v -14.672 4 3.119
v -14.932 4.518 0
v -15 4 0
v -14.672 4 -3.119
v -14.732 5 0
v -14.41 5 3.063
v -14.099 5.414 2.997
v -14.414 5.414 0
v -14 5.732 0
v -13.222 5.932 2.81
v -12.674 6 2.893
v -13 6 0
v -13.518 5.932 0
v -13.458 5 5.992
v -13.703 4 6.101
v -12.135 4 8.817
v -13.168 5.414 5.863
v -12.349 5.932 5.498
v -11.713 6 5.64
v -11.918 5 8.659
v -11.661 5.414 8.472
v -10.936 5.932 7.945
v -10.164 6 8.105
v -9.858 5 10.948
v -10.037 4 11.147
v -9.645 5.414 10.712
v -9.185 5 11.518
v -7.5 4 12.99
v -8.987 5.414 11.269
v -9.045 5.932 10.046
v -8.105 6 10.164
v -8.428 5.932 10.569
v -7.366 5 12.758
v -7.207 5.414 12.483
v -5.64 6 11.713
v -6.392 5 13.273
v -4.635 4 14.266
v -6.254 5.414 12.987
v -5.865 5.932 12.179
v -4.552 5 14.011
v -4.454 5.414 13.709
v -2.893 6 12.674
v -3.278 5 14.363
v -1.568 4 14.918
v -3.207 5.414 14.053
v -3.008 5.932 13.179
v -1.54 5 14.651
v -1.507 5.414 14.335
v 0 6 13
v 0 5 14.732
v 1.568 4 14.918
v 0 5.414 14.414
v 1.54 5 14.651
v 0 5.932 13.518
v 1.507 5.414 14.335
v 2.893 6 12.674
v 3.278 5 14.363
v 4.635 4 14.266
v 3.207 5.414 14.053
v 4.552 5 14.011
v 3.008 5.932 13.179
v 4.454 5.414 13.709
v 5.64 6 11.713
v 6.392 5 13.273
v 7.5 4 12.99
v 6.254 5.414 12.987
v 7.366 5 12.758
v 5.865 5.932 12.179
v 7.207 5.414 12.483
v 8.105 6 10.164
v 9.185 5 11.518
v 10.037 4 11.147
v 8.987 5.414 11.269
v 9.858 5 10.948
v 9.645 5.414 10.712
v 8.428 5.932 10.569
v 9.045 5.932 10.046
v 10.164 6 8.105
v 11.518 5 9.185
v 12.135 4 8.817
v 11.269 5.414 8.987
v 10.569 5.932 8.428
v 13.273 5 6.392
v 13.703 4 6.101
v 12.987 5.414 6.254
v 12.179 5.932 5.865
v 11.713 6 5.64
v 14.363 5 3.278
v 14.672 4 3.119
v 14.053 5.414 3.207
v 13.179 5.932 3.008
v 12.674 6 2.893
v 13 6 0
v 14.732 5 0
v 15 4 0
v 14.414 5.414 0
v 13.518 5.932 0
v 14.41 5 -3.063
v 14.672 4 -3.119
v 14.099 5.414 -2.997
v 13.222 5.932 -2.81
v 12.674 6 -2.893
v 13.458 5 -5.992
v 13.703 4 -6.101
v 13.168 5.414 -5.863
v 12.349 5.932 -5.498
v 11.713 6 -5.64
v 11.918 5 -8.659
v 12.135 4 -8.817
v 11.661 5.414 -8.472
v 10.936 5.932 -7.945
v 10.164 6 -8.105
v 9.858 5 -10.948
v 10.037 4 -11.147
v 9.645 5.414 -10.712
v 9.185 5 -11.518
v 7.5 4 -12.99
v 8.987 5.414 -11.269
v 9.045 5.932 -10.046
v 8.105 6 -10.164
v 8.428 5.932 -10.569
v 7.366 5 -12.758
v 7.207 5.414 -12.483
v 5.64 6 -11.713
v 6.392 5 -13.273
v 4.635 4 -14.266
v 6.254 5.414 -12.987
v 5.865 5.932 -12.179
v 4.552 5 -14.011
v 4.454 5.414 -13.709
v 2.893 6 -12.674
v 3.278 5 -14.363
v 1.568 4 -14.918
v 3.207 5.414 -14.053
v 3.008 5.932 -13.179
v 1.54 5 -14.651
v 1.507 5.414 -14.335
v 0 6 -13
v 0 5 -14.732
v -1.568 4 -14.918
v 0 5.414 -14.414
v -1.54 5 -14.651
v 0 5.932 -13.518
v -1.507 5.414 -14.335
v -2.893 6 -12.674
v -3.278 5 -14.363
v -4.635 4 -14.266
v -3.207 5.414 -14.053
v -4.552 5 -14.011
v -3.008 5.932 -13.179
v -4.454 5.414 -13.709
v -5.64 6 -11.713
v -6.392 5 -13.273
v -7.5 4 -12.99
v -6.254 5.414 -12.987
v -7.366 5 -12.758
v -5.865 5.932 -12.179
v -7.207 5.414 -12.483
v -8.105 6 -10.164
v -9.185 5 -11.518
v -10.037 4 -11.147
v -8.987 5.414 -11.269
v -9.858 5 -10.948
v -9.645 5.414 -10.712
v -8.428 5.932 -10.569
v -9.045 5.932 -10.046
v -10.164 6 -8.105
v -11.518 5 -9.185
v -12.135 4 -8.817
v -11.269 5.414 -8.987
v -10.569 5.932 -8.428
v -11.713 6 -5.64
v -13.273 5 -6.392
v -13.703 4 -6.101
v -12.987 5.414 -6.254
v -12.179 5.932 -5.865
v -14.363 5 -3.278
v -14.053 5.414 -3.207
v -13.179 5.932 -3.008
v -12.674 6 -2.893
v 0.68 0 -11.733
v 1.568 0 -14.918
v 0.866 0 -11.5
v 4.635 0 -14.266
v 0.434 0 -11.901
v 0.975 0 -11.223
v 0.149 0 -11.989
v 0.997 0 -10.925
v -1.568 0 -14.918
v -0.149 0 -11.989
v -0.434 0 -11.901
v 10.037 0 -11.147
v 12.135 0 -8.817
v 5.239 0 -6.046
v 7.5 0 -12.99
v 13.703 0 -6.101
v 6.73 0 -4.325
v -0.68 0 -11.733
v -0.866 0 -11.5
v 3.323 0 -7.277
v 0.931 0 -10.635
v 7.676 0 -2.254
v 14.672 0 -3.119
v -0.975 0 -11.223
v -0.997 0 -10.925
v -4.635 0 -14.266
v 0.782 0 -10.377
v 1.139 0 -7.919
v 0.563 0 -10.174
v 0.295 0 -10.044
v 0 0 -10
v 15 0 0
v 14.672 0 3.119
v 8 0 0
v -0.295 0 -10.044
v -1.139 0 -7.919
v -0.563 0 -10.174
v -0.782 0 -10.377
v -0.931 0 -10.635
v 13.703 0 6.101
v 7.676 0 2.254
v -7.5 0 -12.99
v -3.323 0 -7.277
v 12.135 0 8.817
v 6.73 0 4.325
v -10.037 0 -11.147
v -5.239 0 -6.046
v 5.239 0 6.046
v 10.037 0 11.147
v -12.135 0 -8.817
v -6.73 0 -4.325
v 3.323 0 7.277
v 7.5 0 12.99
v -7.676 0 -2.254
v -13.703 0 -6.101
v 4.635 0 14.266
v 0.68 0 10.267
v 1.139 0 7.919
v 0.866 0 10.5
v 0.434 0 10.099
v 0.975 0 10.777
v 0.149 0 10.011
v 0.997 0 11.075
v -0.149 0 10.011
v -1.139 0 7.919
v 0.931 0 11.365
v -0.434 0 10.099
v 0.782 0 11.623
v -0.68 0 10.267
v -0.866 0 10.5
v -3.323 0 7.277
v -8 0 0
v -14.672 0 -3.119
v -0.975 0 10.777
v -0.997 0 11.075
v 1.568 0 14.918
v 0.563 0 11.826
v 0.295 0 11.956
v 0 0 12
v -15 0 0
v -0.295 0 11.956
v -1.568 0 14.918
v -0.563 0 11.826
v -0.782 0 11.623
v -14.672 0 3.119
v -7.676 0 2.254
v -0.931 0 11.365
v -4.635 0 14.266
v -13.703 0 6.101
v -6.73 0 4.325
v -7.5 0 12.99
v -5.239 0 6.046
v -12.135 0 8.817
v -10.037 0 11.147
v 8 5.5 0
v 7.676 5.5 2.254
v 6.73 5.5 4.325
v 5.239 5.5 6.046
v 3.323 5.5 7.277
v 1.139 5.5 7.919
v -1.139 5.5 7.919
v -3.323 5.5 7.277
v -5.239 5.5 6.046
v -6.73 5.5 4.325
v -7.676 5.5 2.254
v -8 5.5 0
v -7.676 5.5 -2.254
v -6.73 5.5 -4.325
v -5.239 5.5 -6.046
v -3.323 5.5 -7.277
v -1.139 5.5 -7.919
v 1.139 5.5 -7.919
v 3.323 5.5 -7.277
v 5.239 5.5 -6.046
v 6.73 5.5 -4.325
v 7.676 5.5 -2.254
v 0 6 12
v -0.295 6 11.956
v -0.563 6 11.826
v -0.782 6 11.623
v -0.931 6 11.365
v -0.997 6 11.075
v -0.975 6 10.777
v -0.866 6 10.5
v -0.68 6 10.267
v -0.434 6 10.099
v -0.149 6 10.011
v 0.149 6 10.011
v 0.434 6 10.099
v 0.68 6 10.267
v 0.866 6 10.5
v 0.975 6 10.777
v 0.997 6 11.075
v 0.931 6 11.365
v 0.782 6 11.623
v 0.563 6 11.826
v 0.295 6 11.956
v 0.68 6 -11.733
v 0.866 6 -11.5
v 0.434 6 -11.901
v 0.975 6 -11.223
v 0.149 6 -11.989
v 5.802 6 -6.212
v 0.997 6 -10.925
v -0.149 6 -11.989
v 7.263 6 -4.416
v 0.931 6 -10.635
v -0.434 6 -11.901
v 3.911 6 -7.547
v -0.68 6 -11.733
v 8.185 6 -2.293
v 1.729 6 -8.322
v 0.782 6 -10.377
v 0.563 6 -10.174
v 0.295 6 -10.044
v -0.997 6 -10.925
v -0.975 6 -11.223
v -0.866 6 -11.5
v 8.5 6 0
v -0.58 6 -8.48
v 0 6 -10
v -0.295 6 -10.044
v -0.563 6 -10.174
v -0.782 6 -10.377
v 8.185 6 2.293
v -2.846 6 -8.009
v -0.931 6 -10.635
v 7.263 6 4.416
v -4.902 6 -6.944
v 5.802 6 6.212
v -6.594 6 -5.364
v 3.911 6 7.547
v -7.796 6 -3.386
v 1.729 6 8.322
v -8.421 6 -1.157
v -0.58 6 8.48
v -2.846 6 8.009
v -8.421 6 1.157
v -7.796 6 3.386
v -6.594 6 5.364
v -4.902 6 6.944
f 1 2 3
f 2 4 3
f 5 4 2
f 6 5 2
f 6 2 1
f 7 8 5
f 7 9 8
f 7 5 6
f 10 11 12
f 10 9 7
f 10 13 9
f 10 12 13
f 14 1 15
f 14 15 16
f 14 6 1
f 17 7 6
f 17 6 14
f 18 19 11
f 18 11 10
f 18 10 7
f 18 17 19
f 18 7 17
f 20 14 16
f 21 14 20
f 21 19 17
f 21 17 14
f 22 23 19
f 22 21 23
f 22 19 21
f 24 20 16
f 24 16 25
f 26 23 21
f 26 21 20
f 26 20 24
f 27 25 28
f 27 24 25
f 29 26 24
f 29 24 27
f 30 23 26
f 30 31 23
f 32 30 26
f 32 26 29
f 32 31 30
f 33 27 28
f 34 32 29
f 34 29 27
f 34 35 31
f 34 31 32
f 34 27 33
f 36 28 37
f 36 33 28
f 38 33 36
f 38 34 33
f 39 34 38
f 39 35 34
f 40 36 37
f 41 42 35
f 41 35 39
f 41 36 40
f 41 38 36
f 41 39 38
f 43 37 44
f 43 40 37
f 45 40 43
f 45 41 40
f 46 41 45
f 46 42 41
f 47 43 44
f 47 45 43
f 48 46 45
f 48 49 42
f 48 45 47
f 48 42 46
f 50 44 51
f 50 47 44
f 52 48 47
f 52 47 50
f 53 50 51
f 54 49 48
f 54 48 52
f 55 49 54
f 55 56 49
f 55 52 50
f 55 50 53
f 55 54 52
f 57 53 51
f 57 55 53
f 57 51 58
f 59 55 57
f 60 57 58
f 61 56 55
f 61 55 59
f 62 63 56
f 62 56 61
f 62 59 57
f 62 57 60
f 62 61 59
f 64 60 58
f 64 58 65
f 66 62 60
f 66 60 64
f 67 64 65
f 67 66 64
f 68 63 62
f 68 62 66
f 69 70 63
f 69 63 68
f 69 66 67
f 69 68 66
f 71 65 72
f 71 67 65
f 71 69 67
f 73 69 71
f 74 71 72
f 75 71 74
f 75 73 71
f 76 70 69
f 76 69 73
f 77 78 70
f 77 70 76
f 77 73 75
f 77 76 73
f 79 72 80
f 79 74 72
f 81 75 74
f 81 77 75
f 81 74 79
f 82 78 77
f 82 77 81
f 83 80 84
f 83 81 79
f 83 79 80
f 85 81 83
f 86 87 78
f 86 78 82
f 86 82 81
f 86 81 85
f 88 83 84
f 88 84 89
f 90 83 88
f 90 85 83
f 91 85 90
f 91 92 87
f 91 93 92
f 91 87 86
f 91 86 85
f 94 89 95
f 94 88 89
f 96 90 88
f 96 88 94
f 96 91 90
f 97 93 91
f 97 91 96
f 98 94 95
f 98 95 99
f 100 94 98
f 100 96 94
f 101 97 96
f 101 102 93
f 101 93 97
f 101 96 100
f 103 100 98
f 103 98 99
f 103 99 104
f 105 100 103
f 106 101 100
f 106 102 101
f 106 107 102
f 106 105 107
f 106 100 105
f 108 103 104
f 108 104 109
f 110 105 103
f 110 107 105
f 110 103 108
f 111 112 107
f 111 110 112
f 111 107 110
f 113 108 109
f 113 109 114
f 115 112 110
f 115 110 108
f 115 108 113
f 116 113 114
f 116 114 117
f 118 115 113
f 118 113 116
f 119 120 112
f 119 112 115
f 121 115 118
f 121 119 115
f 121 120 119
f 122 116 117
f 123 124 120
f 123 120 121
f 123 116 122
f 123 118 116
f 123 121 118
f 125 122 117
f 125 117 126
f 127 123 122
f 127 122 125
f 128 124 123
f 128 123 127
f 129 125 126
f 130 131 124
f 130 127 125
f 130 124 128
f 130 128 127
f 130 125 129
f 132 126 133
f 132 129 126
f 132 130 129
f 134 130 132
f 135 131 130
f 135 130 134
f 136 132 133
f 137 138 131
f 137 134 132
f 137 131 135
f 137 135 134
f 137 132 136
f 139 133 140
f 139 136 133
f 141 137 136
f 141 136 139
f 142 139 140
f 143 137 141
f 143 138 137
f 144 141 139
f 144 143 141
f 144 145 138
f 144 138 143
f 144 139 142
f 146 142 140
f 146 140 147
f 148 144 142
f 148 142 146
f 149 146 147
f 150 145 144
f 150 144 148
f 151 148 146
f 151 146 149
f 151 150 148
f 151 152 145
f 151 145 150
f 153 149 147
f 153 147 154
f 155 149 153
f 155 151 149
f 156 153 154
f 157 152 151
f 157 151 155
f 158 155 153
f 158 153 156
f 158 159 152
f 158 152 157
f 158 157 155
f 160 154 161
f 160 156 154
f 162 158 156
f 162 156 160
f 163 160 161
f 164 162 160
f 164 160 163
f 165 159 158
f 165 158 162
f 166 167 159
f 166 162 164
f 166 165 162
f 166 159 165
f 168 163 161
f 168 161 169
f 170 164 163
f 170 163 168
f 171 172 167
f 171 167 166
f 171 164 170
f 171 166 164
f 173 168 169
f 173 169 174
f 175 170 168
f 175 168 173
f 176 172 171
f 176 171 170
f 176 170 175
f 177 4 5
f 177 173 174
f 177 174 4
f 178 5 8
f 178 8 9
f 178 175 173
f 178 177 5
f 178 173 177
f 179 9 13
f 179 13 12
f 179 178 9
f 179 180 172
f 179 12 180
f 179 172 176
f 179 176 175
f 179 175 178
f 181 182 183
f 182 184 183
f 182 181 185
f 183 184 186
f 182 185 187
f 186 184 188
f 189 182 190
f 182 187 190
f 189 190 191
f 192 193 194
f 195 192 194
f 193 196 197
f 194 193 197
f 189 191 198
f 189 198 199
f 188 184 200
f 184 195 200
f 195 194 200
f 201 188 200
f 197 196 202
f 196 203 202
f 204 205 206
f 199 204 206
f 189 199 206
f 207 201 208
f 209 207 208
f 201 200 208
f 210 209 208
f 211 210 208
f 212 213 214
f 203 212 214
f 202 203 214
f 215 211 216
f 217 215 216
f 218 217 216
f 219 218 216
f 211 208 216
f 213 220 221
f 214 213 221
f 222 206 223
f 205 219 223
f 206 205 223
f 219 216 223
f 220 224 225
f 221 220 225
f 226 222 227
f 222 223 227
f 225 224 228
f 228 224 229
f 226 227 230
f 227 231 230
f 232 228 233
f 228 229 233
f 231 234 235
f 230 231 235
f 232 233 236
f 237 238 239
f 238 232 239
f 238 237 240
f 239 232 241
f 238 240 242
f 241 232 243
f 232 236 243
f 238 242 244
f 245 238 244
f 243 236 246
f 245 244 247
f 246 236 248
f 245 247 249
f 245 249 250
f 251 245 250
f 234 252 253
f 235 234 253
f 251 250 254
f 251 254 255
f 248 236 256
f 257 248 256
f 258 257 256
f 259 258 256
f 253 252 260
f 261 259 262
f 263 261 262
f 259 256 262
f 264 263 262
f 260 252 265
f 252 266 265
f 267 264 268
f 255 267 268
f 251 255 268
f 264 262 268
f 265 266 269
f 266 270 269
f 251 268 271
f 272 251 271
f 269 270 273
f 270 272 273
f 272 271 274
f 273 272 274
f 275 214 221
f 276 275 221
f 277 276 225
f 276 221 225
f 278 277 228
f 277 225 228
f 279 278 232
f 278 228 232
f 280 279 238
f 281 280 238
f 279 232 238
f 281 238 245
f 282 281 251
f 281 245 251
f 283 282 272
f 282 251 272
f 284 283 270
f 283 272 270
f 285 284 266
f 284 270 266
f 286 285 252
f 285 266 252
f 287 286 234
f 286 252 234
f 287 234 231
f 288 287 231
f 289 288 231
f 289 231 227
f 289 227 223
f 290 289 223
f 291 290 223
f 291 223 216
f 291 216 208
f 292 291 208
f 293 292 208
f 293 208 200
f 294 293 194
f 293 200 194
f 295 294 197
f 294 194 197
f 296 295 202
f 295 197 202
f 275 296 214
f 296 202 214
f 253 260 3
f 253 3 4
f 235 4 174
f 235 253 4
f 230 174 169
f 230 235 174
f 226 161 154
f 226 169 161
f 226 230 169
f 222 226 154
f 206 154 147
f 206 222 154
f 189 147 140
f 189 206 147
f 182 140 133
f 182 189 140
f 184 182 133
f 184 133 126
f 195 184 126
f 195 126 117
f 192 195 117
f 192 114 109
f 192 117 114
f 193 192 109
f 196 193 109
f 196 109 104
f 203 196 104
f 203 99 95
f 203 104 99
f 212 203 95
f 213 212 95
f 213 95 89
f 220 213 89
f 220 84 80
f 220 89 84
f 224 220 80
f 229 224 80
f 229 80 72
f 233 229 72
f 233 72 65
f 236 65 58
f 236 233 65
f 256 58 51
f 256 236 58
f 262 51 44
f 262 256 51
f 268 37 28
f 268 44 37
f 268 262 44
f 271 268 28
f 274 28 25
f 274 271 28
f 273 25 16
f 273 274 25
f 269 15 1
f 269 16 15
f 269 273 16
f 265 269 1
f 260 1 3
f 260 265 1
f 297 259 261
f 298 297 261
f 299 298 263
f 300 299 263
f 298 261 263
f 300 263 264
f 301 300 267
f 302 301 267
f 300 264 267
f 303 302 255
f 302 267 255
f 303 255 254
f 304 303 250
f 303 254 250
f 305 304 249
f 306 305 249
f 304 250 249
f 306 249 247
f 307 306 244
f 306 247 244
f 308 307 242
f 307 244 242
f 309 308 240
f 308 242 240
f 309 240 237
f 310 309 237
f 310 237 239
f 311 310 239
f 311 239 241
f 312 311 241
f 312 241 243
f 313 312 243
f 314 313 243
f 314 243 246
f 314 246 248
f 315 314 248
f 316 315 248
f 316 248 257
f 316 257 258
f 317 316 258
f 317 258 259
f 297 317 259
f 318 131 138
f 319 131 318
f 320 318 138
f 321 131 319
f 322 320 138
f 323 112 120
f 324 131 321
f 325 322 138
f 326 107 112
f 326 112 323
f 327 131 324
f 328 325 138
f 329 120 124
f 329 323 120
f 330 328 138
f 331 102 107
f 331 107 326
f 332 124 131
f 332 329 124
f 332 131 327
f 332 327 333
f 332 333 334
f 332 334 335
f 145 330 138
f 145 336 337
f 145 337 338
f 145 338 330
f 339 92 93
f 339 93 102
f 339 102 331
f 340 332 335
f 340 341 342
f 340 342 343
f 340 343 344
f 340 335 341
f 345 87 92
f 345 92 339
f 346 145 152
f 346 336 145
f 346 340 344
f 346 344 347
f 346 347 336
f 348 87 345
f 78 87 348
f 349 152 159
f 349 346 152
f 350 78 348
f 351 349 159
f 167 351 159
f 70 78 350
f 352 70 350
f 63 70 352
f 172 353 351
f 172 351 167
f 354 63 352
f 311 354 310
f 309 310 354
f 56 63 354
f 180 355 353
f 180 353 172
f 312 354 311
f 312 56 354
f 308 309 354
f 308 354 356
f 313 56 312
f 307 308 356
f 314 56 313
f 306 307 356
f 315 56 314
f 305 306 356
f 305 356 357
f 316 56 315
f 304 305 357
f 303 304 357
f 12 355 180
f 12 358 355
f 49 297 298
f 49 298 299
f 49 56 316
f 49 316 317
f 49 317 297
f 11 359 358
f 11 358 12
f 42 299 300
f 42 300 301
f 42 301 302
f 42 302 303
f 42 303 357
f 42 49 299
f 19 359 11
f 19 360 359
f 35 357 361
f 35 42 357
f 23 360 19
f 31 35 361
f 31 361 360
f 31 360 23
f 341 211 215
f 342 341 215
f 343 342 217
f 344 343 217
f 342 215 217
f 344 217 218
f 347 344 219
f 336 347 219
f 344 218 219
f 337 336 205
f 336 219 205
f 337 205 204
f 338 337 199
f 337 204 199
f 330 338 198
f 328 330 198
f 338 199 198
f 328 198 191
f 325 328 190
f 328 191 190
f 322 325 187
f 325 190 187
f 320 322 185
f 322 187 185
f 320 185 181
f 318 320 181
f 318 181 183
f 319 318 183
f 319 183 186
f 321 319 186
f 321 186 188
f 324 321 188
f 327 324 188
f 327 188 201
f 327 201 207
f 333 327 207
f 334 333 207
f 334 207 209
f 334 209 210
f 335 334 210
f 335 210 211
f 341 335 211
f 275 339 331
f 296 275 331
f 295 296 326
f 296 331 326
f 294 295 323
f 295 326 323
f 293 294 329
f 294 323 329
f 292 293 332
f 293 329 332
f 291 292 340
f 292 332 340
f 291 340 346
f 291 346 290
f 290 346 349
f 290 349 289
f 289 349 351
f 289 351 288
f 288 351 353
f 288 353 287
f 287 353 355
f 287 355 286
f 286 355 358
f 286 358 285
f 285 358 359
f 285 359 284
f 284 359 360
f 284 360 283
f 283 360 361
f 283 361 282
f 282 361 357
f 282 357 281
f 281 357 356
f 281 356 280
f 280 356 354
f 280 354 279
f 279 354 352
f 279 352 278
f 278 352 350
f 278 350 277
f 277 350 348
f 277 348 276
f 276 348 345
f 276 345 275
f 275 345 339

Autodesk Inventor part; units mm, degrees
ref_plane "YZ Plane" through (0, 0, 0) normal (1, 0, 0) x (0, 1, 0)
ref_plane "XZ Plane" through (0, 0, 0) normal (0, 1, 0) x (-1, 0, 0)
ref_plane "XY Plane" through (0, 0, 0) normal (0, 0, 1) x (1, 0, 0)
sketch "Boceto1" plane through (0, 0, 0) normal (0, 1, 0) x (-1, 0, 0)
  circle A0 centre (0, 0) radius 15
  dimension "d0" = 30
extrude "Extrusión1" add sketch "Boceto1" along normal blind 6
sketch "Boceto2" plane through (0, 0, 0) normal (0, -1, 0) x (1, 0, 0)
  circle A0 centre (0, 0) radius 8
  dimension "d3" = 16
extrude "Extrusión2" cut sketch "Boceto2" against normal through all
fillet "Empalme1" radius 2 1 edges at (15, 6, 0)
chamfer "Chaflán1" distance 0.5 angle 45 1 edges at (-8, 6, 0)
sketch "Boceto3" plane through (0, 6, 0) normal (0, 1, 0) x (1, 0, 0)
  circle A0 centre (0, 0) radius 13 projected
  circle A1 centre (0, 0) radius 11 construction
  point P0 (0, 11)
  point P1 (0, -11)
  dimension "d10" = 2
hole "Agujero1" at (0, 6, -11) at (0, 6, 11) direction (0, -1, 0) diameter 2 end through all
properties part number "wheel_washer" material "Aluminio 6061"
